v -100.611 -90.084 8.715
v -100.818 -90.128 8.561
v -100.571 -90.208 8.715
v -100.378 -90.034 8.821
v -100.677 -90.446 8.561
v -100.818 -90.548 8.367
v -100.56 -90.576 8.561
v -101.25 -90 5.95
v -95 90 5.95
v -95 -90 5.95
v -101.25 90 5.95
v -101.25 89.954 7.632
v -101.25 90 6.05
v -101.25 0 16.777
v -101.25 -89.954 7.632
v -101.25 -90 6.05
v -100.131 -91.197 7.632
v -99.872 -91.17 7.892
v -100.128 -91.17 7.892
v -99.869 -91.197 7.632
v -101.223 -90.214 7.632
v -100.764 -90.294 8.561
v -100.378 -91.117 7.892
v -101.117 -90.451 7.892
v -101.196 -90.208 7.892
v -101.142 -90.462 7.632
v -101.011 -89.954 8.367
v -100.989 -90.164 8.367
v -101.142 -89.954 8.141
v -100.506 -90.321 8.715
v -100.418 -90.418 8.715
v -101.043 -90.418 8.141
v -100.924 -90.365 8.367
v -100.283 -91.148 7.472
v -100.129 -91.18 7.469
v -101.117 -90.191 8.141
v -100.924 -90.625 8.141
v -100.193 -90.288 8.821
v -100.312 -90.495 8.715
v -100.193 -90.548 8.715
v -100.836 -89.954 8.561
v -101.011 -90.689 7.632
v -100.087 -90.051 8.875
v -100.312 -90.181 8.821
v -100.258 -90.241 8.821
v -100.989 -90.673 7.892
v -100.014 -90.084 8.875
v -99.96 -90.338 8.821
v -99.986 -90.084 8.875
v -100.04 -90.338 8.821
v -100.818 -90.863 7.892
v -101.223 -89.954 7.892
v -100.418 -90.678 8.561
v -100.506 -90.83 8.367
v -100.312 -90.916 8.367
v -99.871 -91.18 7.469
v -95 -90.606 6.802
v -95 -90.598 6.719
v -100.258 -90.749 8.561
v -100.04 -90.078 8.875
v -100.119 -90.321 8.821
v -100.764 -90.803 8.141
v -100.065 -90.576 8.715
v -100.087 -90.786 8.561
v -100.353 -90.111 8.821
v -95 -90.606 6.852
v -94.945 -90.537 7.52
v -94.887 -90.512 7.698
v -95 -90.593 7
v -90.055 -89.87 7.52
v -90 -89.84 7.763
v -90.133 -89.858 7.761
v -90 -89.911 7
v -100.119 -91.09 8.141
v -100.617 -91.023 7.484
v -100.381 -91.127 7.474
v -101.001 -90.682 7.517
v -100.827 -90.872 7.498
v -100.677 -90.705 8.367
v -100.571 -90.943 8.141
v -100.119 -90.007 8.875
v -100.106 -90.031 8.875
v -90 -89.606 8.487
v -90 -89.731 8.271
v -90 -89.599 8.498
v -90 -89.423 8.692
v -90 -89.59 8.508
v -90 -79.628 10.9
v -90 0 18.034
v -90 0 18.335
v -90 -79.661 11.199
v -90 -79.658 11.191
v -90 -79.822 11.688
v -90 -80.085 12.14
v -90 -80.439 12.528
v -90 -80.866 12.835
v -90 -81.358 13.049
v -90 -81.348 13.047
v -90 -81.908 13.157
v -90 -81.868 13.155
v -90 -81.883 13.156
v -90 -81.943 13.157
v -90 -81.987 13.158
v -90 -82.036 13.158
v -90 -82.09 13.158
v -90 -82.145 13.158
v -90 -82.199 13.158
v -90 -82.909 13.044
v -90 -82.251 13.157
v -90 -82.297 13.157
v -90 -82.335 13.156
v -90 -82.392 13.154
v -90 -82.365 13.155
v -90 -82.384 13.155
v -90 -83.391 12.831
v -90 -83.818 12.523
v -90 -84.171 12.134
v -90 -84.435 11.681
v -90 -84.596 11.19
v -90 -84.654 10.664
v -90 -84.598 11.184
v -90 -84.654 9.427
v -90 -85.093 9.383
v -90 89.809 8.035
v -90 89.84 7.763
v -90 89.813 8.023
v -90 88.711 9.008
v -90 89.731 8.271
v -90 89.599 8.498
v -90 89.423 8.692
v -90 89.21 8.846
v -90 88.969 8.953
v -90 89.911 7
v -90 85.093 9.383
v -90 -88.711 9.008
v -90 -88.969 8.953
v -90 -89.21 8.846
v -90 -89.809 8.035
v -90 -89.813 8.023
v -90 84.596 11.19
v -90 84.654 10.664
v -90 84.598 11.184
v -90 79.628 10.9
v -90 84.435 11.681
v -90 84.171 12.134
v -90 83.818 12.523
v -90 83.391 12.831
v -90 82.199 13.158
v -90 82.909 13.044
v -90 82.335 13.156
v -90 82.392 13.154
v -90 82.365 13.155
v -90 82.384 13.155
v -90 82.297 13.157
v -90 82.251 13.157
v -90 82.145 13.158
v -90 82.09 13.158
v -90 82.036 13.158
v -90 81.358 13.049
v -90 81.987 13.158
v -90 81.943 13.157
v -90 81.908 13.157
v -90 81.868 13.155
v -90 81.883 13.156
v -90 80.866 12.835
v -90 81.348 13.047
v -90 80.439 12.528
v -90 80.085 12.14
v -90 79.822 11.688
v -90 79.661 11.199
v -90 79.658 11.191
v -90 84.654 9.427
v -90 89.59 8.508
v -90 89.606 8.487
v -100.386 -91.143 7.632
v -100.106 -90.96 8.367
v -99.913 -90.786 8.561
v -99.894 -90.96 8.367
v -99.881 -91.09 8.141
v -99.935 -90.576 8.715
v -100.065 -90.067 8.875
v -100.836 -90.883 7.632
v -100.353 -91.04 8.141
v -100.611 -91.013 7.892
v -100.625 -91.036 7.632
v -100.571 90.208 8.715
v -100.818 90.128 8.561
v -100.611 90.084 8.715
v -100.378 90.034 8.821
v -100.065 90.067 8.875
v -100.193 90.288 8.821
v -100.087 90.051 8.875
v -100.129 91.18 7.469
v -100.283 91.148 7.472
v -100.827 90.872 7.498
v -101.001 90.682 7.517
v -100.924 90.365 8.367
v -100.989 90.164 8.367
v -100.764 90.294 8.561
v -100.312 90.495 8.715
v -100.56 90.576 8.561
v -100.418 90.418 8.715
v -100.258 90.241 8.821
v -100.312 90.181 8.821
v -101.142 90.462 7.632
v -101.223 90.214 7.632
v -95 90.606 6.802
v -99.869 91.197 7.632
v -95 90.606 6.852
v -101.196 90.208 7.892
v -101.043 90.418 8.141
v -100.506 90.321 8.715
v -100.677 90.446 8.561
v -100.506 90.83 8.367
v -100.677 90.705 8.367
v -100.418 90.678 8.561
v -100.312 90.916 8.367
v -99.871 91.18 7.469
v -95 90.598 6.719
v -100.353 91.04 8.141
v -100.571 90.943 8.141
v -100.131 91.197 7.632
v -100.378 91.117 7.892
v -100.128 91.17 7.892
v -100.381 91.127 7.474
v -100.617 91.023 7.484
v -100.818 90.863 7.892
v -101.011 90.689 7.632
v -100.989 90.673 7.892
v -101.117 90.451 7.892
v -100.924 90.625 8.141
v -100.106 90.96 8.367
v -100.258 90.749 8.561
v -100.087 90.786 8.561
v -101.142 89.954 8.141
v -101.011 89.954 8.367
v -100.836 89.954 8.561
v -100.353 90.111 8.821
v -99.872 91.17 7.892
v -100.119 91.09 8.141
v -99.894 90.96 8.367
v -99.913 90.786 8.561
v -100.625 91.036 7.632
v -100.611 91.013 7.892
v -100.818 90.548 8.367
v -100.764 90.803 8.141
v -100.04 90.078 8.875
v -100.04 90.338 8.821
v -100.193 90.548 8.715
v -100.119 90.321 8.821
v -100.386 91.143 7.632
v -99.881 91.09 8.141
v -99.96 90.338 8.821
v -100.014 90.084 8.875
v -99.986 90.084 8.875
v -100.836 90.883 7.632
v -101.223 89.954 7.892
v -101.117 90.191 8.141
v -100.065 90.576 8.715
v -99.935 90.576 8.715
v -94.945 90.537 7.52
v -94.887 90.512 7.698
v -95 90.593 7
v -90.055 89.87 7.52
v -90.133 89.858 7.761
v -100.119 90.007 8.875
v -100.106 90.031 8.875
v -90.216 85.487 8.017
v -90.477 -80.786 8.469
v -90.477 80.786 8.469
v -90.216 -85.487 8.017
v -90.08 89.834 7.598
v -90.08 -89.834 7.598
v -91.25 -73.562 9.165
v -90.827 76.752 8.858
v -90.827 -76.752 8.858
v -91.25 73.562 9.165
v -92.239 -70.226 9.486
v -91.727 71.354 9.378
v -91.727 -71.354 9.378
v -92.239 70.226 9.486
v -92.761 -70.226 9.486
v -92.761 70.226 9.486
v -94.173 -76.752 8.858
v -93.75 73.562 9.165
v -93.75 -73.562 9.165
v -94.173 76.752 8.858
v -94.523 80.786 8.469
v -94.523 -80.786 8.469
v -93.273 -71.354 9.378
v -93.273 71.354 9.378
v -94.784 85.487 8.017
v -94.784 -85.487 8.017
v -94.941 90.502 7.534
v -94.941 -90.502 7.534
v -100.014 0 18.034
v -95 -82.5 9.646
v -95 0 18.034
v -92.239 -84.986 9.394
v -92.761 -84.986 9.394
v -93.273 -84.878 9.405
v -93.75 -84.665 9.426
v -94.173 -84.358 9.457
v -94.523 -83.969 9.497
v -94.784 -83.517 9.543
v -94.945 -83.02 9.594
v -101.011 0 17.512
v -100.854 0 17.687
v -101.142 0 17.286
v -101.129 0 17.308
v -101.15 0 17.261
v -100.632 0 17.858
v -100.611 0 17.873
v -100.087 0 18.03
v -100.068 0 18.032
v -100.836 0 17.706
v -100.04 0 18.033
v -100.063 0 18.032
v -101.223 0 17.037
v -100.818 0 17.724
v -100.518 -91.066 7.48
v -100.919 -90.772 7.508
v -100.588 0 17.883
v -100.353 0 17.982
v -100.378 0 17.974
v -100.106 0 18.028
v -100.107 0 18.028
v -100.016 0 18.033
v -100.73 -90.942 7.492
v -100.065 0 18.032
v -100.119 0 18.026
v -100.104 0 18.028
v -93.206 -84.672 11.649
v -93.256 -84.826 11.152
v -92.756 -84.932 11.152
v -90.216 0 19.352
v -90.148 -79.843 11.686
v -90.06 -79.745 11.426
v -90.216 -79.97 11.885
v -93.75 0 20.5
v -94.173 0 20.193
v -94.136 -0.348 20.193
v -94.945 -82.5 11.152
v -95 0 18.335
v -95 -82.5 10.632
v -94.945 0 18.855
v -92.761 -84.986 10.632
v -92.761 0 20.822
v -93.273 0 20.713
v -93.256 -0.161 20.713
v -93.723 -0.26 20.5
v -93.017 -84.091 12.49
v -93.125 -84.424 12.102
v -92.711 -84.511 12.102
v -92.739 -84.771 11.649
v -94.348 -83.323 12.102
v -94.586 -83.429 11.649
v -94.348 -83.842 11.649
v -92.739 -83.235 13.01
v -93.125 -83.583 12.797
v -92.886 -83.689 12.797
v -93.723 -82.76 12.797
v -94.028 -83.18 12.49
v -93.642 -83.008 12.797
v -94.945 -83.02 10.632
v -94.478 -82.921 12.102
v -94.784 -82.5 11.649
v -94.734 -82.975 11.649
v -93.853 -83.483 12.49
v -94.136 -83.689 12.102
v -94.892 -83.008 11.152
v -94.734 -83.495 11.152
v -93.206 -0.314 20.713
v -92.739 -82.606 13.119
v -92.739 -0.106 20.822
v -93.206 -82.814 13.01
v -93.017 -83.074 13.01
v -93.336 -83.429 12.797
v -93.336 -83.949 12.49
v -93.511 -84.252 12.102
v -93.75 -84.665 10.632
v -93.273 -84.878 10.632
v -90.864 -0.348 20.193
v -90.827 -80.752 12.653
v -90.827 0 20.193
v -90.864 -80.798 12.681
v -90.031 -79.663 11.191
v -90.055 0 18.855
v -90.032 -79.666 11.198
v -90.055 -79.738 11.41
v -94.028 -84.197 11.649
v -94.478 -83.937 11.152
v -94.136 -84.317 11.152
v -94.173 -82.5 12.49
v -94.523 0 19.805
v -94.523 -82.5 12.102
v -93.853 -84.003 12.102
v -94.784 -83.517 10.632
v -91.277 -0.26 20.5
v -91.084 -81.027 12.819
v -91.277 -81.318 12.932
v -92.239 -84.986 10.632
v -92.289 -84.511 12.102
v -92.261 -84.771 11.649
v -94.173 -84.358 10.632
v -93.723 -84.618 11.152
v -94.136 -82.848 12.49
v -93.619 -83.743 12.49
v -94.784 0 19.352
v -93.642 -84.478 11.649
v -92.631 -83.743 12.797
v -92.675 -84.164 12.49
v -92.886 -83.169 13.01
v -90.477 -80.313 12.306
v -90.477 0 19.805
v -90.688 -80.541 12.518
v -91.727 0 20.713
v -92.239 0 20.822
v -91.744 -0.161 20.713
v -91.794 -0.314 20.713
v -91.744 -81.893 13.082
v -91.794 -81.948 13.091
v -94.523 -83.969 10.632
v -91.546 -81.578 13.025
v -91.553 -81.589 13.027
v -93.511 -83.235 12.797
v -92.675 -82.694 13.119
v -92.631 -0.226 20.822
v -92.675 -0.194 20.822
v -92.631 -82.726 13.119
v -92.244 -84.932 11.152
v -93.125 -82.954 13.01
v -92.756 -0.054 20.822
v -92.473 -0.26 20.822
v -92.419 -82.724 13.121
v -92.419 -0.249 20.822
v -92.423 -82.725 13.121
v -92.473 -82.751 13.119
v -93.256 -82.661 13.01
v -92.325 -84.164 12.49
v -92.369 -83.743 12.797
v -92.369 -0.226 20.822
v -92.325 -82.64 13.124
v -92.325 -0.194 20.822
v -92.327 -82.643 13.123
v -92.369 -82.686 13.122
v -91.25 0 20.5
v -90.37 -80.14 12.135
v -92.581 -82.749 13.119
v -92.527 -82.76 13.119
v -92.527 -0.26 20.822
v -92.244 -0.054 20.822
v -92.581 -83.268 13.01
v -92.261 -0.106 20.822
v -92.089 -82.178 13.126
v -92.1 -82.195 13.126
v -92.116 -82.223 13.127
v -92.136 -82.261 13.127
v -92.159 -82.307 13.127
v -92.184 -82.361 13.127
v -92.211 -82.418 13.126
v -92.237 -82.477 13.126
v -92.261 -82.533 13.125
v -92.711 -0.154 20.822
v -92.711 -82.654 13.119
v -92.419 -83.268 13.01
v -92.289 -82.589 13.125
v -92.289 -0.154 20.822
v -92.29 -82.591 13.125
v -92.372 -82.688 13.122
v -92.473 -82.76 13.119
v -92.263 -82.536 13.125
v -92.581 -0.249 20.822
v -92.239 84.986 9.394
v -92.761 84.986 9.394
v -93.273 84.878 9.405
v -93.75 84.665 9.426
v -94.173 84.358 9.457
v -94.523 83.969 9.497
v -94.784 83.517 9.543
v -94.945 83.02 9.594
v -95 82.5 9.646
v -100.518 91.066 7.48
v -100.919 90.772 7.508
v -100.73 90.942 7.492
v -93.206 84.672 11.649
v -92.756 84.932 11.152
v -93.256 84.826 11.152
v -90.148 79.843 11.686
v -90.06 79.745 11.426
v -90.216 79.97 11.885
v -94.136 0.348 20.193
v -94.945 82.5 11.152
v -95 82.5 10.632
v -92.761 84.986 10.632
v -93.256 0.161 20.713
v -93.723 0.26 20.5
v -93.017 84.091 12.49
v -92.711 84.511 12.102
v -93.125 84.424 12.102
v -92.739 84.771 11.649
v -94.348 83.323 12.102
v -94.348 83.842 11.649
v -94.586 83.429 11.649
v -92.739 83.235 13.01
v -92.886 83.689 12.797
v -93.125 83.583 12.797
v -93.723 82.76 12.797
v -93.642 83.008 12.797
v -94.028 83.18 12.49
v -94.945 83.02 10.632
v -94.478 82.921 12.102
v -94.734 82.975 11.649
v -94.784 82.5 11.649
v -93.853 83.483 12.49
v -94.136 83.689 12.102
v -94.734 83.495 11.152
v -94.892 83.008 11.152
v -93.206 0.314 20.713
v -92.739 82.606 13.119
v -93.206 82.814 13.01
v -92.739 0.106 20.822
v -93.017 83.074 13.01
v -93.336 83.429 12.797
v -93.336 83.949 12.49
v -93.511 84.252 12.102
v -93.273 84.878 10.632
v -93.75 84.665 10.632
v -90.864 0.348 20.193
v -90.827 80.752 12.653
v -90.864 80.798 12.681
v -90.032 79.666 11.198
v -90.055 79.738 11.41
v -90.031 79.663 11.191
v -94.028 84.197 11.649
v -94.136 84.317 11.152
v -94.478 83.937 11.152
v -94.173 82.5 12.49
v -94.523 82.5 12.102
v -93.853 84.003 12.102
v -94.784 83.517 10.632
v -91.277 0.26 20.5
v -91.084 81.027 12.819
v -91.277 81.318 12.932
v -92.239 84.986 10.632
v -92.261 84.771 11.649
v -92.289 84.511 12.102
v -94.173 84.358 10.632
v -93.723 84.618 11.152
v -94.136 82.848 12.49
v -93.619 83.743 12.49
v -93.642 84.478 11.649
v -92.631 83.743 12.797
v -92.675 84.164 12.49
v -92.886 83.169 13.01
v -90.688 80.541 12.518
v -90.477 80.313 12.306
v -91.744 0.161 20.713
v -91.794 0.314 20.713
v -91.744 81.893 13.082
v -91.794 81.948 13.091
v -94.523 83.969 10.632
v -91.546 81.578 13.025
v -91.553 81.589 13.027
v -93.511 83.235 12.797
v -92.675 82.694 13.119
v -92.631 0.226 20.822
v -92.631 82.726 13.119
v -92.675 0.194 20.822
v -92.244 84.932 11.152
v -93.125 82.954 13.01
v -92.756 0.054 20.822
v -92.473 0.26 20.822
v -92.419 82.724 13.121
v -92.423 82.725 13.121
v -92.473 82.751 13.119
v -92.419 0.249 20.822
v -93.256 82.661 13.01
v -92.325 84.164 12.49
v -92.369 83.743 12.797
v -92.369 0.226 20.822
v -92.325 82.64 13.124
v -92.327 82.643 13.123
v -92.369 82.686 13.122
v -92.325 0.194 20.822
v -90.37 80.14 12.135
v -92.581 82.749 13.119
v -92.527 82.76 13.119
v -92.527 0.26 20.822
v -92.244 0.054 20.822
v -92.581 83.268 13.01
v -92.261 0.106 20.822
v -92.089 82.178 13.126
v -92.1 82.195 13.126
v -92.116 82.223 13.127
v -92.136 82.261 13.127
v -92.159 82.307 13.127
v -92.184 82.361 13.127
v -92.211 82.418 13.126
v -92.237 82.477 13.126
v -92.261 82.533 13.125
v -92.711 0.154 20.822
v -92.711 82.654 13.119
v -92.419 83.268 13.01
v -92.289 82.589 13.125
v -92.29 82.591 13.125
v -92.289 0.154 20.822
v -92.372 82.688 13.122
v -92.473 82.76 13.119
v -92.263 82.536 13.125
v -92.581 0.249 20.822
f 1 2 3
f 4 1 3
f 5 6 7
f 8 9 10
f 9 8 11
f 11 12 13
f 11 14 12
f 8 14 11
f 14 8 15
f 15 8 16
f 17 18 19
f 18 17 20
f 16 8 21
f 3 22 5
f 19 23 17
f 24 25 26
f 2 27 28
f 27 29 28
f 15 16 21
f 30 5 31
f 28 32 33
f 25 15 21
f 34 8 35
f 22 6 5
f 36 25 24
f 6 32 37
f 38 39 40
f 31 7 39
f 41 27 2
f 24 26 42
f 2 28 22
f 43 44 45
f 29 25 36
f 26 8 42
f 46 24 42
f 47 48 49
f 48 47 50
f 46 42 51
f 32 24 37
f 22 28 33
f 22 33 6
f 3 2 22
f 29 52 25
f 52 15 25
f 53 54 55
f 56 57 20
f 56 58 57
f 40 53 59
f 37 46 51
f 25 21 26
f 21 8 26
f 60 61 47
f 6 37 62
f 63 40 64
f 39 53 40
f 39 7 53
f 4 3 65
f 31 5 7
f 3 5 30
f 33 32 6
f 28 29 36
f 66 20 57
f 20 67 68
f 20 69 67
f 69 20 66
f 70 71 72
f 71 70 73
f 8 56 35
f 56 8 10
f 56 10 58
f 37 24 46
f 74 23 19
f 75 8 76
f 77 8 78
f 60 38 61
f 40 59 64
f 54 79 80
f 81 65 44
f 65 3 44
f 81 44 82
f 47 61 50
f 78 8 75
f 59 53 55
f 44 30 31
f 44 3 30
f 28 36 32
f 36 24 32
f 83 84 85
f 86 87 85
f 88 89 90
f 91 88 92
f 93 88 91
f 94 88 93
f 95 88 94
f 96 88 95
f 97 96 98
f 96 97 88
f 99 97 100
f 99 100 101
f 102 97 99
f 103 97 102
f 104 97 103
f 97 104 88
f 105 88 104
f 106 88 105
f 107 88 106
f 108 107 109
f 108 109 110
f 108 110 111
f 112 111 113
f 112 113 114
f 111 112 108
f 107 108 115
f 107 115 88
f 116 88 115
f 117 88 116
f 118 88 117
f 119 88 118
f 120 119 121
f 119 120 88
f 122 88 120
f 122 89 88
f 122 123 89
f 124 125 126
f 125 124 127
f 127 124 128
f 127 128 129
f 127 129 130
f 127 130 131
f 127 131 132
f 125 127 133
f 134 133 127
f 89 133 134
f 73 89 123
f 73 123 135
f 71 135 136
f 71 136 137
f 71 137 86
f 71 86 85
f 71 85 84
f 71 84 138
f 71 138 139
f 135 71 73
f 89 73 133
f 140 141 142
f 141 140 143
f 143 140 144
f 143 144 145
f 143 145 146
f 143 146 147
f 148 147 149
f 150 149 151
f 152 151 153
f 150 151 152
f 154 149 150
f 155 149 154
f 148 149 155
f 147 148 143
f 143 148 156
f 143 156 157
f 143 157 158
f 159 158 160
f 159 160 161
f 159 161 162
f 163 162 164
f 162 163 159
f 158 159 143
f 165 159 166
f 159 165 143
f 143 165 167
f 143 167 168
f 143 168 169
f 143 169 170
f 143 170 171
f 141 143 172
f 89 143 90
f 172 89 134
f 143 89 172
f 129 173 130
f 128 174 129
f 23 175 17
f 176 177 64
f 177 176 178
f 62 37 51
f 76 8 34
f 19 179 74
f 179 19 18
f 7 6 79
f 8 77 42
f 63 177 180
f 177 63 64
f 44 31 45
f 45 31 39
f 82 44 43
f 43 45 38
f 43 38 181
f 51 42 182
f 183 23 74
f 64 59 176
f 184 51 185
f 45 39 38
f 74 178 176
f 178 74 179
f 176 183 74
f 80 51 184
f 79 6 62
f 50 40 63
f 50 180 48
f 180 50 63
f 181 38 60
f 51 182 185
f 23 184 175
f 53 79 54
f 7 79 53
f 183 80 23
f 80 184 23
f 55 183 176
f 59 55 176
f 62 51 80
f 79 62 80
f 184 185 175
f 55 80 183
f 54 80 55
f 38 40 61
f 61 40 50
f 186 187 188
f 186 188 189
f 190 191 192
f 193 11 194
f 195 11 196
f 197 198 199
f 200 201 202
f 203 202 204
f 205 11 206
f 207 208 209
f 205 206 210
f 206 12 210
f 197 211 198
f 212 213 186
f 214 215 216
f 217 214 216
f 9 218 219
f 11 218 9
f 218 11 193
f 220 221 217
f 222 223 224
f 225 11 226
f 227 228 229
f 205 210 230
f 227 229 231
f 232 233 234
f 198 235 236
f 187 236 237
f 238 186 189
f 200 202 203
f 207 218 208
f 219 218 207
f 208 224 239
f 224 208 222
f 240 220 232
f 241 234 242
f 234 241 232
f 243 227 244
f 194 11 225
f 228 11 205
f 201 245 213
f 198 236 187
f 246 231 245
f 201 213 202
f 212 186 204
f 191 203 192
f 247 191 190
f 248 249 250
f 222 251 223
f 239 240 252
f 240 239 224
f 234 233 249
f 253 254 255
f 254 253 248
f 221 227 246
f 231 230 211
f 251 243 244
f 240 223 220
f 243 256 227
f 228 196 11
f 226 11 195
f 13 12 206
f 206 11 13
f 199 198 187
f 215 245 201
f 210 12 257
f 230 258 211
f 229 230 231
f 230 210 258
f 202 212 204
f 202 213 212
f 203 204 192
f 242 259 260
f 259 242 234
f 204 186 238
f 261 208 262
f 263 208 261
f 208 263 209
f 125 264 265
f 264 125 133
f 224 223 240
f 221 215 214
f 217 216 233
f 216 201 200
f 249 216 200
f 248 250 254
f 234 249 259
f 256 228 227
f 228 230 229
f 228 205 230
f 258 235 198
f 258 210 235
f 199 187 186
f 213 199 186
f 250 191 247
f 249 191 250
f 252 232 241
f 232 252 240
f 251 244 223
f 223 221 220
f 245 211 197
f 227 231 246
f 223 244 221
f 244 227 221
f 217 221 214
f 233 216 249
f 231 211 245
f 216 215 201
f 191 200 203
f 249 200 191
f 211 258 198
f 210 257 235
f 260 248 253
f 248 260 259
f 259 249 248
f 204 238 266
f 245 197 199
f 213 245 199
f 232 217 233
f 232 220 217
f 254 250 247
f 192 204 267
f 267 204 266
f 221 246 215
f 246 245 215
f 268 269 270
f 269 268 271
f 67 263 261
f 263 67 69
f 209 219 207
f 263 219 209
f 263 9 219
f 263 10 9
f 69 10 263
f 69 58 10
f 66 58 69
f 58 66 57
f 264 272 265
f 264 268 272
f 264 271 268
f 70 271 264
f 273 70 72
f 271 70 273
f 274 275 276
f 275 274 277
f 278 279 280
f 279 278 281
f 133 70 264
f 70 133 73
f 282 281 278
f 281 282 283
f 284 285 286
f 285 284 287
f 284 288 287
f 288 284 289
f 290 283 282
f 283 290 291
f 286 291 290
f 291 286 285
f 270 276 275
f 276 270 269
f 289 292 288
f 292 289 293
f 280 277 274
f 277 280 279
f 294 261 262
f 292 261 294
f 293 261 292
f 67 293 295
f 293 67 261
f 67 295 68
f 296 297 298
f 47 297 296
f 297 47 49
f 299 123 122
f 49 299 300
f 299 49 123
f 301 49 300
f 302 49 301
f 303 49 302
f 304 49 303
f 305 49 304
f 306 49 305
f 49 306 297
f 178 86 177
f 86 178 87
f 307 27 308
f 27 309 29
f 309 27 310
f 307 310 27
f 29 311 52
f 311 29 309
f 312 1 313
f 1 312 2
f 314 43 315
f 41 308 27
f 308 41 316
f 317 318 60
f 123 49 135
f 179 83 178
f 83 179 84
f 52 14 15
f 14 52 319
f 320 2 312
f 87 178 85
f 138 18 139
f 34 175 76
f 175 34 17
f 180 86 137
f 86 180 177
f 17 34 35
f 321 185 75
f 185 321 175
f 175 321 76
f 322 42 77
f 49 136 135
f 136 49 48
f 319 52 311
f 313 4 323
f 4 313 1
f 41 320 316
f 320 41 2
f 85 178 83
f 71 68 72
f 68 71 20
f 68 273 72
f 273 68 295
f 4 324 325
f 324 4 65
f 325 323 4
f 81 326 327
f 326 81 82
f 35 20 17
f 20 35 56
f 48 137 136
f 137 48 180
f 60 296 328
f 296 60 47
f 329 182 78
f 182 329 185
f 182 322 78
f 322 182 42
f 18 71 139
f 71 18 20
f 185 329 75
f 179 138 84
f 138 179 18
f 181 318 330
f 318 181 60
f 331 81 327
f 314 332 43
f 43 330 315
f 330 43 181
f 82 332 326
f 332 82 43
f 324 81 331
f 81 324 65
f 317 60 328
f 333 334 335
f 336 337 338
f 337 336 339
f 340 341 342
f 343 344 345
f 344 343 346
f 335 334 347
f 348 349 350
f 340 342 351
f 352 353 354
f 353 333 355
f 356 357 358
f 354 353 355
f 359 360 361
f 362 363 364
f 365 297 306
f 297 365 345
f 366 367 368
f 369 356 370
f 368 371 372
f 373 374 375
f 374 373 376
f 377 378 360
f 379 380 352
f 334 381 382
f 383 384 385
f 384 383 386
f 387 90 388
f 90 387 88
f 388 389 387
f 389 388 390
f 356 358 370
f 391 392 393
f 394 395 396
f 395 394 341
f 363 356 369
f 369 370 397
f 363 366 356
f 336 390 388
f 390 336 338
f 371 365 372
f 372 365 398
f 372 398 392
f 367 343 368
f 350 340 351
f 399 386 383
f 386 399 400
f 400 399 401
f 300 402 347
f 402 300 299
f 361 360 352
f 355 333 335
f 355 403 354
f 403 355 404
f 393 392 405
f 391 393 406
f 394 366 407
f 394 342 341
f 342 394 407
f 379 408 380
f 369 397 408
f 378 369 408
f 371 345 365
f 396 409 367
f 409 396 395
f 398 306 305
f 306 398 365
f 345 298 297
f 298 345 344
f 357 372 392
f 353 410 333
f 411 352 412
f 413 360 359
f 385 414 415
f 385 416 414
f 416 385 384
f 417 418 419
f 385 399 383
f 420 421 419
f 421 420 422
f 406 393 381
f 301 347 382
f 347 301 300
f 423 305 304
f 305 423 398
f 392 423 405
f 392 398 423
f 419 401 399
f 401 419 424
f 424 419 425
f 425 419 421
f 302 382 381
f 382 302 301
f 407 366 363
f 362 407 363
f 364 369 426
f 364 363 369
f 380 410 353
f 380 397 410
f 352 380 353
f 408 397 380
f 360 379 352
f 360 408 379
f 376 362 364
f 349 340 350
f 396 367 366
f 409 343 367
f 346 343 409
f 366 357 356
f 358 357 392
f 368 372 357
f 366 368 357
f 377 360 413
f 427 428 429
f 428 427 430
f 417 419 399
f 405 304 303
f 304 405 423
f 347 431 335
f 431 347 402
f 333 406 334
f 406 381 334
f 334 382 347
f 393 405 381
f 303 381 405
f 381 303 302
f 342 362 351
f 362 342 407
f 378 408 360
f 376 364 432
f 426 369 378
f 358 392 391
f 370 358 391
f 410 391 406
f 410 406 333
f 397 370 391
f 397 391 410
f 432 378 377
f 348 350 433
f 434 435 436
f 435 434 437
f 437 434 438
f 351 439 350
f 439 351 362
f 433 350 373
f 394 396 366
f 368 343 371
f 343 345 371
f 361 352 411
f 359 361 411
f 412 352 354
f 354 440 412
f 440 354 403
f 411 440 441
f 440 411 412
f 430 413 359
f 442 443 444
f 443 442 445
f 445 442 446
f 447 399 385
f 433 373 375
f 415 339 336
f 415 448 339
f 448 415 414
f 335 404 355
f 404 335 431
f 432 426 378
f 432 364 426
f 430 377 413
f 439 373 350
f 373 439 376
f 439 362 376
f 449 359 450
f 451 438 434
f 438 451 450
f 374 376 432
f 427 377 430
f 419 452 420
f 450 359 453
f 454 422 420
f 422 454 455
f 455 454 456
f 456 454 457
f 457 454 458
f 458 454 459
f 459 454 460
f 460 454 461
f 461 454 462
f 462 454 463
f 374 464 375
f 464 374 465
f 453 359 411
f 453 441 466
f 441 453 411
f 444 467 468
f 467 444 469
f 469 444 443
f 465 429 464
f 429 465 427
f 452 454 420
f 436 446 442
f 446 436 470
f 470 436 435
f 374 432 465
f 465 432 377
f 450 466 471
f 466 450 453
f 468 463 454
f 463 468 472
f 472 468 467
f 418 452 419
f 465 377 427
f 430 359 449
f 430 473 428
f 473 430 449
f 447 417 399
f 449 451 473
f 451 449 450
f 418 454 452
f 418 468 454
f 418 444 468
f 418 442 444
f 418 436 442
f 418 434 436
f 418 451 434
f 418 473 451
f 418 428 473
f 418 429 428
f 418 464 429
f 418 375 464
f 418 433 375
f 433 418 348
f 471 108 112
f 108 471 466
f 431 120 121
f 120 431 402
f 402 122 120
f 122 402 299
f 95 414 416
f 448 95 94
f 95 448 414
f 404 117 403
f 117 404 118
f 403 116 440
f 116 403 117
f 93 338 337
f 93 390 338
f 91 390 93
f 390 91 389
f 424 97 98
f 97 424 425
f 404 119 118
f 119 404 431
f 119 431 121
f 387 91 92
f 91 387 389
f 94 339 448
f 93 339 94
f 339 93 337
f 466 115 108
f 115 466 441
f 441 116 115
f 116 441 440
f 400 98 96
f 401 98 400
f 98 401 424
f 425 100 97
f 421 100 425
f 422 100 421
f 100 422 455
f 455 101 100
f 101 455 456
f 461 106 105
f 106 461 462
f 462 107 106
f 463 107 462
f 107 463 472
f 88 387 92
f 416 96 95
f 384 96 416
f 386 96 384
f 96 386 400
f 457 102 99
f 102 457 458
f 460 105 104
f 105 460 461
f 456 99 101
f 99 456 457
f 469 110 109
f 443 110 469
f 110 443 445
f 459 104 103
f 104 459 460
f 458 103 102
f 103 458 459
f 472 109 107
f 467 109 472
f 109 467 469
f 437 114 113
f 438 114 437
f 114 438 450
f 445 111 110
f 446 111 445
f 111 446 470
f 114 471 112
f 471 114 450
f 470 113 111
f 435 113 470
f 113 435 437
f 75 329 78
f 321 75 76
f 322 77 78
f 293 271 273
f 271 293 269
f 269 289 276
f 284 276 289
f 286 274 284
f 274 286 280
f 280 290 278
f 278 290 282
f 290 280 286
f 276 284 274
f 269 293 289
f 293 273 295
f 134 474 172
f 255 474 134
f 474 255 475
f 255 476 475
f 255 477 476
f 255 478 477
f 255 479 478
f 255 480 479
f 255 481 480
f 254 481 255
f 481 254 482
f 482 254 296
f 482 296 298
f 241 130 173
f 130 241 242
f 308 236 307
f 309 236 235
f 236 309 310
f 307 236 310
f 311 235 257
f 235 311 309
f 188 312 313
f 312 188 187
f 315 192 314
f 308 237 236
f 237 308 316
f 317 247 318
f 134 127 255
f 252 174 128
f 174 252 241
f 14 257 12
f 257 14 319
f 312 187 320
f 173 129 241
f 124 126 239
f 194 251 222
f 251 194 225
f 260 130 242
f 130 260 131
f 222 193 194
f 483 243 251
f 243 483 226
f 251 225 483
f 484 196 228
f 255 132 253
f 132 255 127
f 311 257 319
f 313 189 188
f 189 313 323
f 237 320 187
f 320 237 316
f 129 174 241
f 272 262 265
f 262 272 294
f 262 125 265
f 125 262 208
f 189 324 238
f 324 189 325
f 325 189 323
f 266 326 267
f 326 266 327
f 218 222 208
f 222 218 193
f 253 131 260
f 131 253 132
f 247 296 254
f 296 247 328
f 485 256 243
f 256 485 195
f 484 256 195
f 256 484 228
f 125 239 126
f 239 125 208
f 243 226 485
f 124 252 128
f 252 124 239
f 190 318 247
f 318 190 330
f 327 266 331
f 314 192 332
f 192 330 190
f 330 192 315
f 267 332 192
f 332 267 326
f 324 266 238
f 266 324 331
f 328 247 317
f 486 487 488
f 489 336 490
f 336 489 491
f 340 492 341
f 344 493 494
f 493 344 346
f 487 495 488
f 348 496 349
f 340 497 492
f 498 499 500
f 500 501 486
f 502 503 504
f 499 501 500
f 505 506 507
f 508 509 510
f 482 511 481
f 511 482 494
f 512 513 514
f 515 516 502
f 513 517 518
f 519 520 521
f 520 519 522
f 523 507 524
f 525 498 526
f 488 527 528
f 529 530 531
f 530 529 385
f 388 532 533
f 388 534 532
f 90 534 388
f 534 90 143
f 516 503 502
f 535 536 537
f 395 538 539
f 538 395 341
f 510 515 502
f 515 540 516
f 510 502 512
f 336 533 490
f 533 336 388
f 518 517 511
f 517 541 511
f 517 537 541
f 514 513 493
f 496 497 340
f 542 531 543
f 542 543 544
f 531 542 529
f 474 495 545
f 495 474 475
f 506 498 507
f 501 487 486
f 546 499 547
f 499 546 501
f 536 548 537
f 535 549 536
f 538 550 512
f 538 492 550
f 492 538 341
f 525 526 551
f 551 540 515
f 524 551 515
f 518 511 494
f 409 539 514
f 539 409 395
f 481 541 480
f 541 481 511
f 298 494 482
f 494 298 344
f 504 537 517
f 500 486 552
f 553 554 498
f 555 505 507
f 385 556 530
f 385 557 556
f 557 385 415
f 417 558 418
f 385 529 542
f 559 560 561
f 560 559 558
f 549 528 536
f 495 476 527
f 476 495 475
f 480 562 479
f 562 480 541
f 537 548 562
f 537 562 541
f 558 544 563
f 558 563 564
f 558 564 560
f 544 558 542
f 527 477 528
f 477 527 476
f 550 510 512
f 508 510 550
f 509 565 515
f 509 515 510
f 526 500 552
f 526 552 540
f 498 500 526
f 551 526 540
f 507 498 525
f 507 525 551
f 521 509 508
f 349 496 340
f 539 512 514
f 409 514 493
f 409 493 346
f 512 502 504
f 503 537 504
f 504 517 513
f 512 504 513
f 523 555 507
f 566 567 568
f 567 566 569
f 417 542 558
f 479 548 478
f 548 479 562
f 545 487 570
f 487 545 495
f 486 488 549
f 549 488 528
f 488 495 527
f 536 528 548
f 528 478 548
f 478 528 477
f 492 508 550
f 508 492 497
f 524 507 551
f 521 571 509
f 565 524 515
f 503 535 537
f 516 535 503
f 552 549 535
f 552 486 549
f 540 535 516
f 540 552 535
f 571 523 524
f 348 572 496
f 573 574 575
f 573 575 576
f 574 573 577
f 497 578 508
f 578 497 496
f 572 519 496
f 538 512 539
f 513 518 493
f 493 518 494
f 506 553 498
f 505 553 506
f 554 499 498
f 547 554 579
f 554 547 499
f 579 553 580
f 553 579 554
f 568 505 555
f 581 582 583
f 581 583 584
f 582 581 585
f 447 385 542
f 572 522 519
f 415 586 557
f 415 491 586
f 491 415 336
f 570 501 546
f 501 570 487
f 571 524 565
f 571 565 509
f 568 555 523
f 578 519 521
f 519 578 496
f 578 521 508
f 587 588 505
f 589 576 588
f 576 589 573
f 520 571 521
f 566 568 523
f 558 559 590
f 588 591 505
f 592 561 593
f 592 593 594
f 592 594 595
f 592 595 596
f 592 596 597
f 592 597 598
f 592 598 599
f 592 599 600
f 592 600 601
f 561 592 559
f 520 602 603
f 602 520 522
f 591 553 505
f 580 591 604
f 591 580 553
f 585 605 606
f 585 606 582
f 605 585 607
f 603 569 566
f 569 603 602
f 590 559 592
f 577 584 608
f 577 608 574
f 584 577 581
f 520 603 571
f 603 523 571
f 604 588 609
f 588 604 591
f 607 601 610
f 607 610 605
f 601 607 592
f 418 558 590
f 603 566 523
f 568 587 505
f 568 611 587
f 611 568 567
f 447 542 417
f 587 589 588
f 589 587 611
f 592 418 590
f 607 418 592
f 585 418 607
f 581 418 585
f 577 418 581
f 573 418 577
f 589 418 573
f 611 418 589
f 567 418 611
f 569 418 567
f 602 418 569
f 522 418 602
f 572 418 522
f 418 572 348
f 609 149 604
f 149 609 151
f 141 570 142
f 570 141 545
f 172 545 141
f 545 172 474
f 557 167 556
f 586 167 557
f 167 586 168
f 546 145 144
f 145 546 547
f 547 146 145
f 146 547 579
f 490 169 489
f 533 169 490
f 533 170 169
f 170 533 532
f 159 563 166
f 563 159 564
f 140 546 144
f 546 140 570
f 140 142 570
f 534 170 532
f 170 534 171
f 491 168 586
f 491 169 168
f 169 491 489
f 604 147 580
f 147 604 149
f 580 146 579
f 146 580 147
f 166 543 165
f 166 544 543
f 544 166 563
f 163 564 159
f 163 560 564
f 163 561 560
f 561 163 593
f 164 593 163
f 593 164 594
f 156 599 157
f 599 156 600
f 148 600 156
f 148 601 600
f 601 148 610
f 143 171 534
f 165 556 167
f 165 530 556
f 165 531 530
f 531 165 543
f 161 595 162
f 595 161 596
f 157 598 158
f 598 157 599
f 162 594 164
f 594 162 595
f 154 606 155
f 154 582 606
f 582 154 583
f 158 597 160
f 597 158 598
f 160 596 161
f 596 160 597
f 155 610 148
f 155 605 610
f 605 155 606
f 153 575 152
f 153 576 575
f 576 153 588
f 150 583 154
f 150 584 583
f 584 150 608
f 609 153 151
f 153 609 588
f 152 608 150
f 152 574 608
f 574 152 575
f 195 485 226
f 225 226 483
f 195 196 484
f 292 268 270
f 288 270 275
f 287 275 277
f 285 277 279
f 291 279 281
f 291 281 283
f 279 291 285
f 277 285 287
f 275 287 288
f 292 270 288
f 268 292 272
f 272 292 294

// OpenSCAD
HX=180;
HYR=105;
HYL=160;
ANG=5.5;
HHR=HYR/(2*sin(90-ANG));
HHL=HYL/(2*sin(90-ANG));
BX=500;
BY=160;
BA=BY*sin(ANG);

*boat(HX,HHR,HYR,HHL,HYL);
*holderV2(HX,HHL,HYL,HHR,HYR,1.25,10,30);
*mirror([0,1,0]) holderV2(HX,HHL,HYL,HHR,HYR,1.25,10,30);
*translate([0,0,4]) cover(HX,HHL,HYL,HHR,HYR,7,15,4,1.5,30);
*translate([-80,-40,BA+0.5]) rotate([0,0,0]) fixer(8,5,8,60);
*translate([30,35,25])SwedenAntHolder();
*ColAntenaHolder();
seal_fixer(HX,HHL,HYL,HHR,HYR,1.25,10,30);

*ColAntenaHolder_p2();

*translate([200,0,35]) calypsoMount();

module calypsoMount(){
   difference(){
      union(){
         translate([0,0,1])
         hull(){
            rotate_extrude(convexity = 10,$fn=100)
                     translate([20.5, 0, 0])
                     circle(r = 5,$fn=100);
            translate([0,0,-4.5]) cylinder(h=1,r=25.8,center=true,$fn=100);
         }
         translate([0,0,-11])
         rotate_extrude(convexity = 10,$fn=100)
         difference(){
            translate([7,0]) square([14,15],center=true);
            translate([7.5+7, 0, 0]) circle(r = 7.5,$fn=100);
         }
         hull(){
            translate([0,-20,-20]) rotate([5.5,0,0]) cylinder(h=2,r=12,center=true,$fn=50);
            translate([0,0,-18]) rotate([0,90,0]) cylinder(h=24,r=1,center=true,$fn=50);
            
         }
         hull(){
            translate([0,20,-20]) rotate([-5.5,0,0]) cylinder(h=2,r=12,center=true,$fn=50);
            translate([0,0,-18]) rotate([0,90,0]) cylinder(h=24,r=1,center=true,$fn=50);
            
         }
      }
      for(i=[-27.5:120:360]){
         rotate([0,0,i]) translate([19,0,-0.5]) rotate([0,90,0]) cylinder(h=15,r=1.65,center=true,$fn=50);
      }
      cylinder(h=40,r=6,center=true,$fn=50);
      translate([0,-25,-20]) rotate([5.5,0,0]) cylinder(h=10,r=2,center=true,$fn=50);
      translate([0,25,-20]) rotate([-5.5,0,0]) cylinder(h=10,r=2,center=true,$fn=50);
   }
   
}

module ColAntenaHolder(){
   translate([24,-21.35,35]) rotate([-90,0,90]) SwedenAntHolder();
   difference(){
      translate([0,0,23.5]) cylinder(h=10,r=24,center=true,$fn=100);
      hull(){cover(HX,HY,HH,7,15,3,1.5,30);}
      translate([0,0,23.5]) cylinder(h=12,r=9.5,center=true,$fn=100);
      for(i=[0:120:360]){
         rotate([0,0,i]) translate([20,0,28]) cylinder(h=20,r=1.6,center=true,$fn=20);
      }
   }
}

module ColAntenaHolder_p2(){
   difference(){
      translate([0,0,15.5]) cylinder(h=11,r=11,center=true,$fn=100);
      rotate([0,0,30]) translate([0,0,15.5]) cylinder(h=15,r=9,center=true,$fn=6);
   }
   difference(){
      translate([0,0,14]) cylinder(h=8,r=24,center=true,$fn=100);
      translate([0,0,0]) cover(HX,HY,HH,7,15,3,1.5,30);
      translate([0,0,14]) cylinder(h=9,r=9.5,center=true,$fn=100);
      for(i=[0:120:360]){
         rotate([0,0,i]) translate([20,0,10]) cylinder(h=20,r=1.6,center=true,$fn=20);
      }
   }
}

module SwedenAntHolder(){
   translate([24,-21.35,0]) rotate([-90,0,90]) import("puck_antenna_mount.stl", convexity = 5);
}

module boat(hx,hhR,hyR,hhL,hyL){
   ha=HHR*sin(ANG);
   difference(){
      union(){
         translate([0,-(BY*sin(90-ANG))/2,BA/2]) rotate([ANG,0,0])cube([BX,BY,2],center=true);
         translate([0,(BY*sin(90-ANG))/2,BA/2]) rotate([-ANG,0,0])cube([BX,BY,2],center=true);
      }
      linear_extrude(height = 40, center = true, convexity = 10, twist = 0) 
      polygon(points=[[hx/2,hyR/2],[hx/2,-hyR/2],[-hx/2,-hyL/2],[-hx/2,hyL/2]]);
   }
}

module seal_fixer(hx,hhL,hyL,hhR,hyR,th,d,fn){
   difference(){
      union(){
         hull(){
            difference(){
               union(){
                  hull(){
                     translate([(hx/2+d),d,1.5+BA+d*sin(ANG)]) sphere(th,$fn=fn);
                     translate([-(hx/2+d),d,1.5+BA+d*sin(ANG)]) sphere(th,$fn=fn);
                     translate([-(hx/2+d),-(hyL/2+d*cos(ANG)),BA-(hhL)*sin(ANG)]) sphere(th,$fn=fn);
                     translate([(hx/2+d),-(hyR/2+d*cos(ANG)),BA-(hhR)*sin(ANG)]) sphere(th,$fn=fn);
                     
                  }
                  
               }
               translate([0,BY/4,BA]) cube([BX,BY/2,BA],center=true);
               translate([0,-(hhR+d)*sin(90-ANG)/2+1,BA-(hhR+d)*sin(ANG)/2-1]) rotate([ANG,0,0])cube([hx+3*d,2*hhL+2*d+1,4],center=true);
               cube([hx,2*hyR,hyR],center=true);
               translate([d,0,0]) cube([hx+d,2*hyR,hyR],center=true);
            }
            translate([-hx/2-d/2-1.25/2,-hyL/4-d/2,6])cube([d+1.25,hyL/2+d,0.1],center=true);
         }
         mirror([0,1,0])
         hull(){
            difference(){
               union(){
                  hull(){
                     translate([(hx/2+d),d,1.5+BA+d*sin(ANG)]) sphere(th,$fn=fn);
                     translate([-(hx/2+d),d,1.5+BA+d*sin(ANG)]) sphere(th,$fn=fn);
                     translate([-(hx/2+d),-(hyL/2+d*cos(ANG)),BA-(hhL)*sin(ANG)]) sphere(th,$fn=fn);
                     translate([(hx/2+d),-(hyR/2+d*cos(ANG)),BA-(hhR)*sin(ANG)]) sphere(th,$fn=fn);
                     
                  }
                  
               }
               translate([0,BY/4,BA]) cube([BX,BY/2,BA],center=true);
               translate([0,-(hhR+d)*sin(90-ANG)/2+1,BA-(hhR+d)*sin(ANG)/2-1]) rotate([ANG,0,0])cube([hx+3*d,2*hhL+2*d+1,4],center=true);
               cube([hx,2*hyR,hyR],center=true);
               translate([d,0,0]) cube([hx+d,2*hyR,hyR],center=true);
            }
            translate([-hx/2-d/2-1.25/2,-hyL/4-d/2,6])cube([d+1.25,hyL/2+d,0.1],center=true);
         }
         
      }
      hull(){
            translate([-hx/2-2*th,0,7]) rotate([90,0,0]) cylinder(h=2*hyL,r=2*th,center=true,$fn=fn);
            translate([-hx/2-2*th,0,-2]) rotate([90,0,0]) cylinder(h=2*hyL,r=2*th,center=true,$fn=fn);
         }
   }
   difference(){
      union(){
         holderV2(HX,HHL,HYL,HHR,HYR,1.25,10,30);
         mirror([0,1,0]) holderV2(HX,HHL,HYL,HHR,HYR,1.25,10,30);
      }
      translate([d/2+2,0,0]) cube([hx+d+4,4*hyR,hyR],center=true);
   }
}

module holderV2(hx,hhL,hyL,hhR,hyR,th,d,fn){
   ha=HHR*sin(ANG);
   difference(){
      union(){
         rotate([0,0,0])
         hull(){
            translate([(hx/2+d),d,1.5+BA+d*sin(ANG)]) sphere(th,$fn=fn);
            translate([-(hx/2+d),d,1.5+BA+d*sin(ANG)]) sphere(th,$fn=fn);
            translate([-(hx/2+d),-(hyL/2+d*cos(ANG)),BA-(hhL)*sin(ANG)]) sphere(th,$fn=fn);
            translate([(hx/2+d),-(hyR/2+d*cos(ANG)),BA-(hhR)*sin(ANG)]) sphere(th,$fn=fn);
         }
         hull(){
            translate([-(hx/2+2*th),0,BA]) sphere(2*th,$fn=fn);
            translate([-(hx/2+2*th),0,3+BA]) sphere(2*th,$fn=fn);
            translate([-(hx/2+2*th),-(hyL/2+2*th),BA-hhL*sin(ANG)]) sphere(2*th,$fn=fn);
            translate([-(hx/2+2*th),-(hyL/2+2*th),3+BA-hhL*sin(ANG)]) sphere(2*th,$fn=fn);
         }
         
         hull(){
            translate([-(hx/2+2*th),-(hyL/2+2*th),BA-hhL*sin(ANG)]) sphere(2*th,$fn=fn);
            translate([-(hx/2+2*th),-(hyL/2+2*th),3+BA-hhL*sin(ANG)]) sphere(2*th,$fn=fn);
            translate([(hx/2+2*th),-(hyR/2+2*th),BA-hhR*sin(ANG)]) sphere(2*th,$fn=fn);
            translate([(hx/2+2*th),-(hyR/2+2*th),3+BA-hhR*sin(ANG)]) sphere(2*th,$fn=fn);
         }
         hull(){
            translate([(hx/2+2*th),0,BA]) sphere(2*th,$fn=fn);
            translate([(hx/2+2*th),0,3+BA]) sphere(2*th,$fn=fn);
            translate([(hx/2+2*th),-(hyR/2+2*th),BA-hhR*sin(ANG)]) sphere(2*th,$fn=fn);
            translate([(hx/2+2*th),-(hyR/2+2*th),3+BA-hhR*sin(ANG)]) sphere(2*th,$fn=fn);
         }
      }

      linear_extrude(height = 40, center = true, convexity = 10, twist = 0) 
      polygon(points=[[hx/2,hyR/2],[hx/2,-hyR/2],[-hx/2,-hyL/2],[-hx/2,hyL/2]]);
      cube([hx,hyR/2,hyR],center=true);
      translate([0,BY/4,BA]) cube([BX,BY/2,BA],center=true);
      translate([0,-(hhR+d)*sin(90-ANG)/2+1,BA-(hhR+d)*sin(ANG)/2-1]) rotate([ANG,0,0])cube([hx+3*d,2*hhL+2*d+1,4],center=true);
   }
}

module holder(hx,hh,hy,th,d,fn){
   ha=HH*sin(ANG);
   difference(){
      union(){
         #translate([0,-((hh)*sin(90-ANG))/2,-(hh)*sin(ANG)/2+BA+sin(90-ANG)]) rotate([ANG,0,0])
         hull(){
            translate([(hx/2+d),(hh/2+d),0]) sphere(th,$fn=fn);
            translate([-(hx/2+d),(hh/2+d),0]) sphere(th,$fn=fn);
            translate([-(hx/2+d),-(hh/2+d),0]) sphere(th,$fn=fn);
            translate([(hx/2+d),-(hh/2+d),0]) sphere(th,$fn=fn);
         }
         hull(){
            translate([-(hx/2+2*th),0,BA+8*sin(ANG)-th/2]) sphere(2*th,$fn=fn);
            translate([-(hx/2+2*th),0,3+BA+8*sin(ANG)-th/2]) sphere(2*th,$fn=fn);
            translate([-(hx/2+2*th),-(hy/2+2*th),ha+8*sin(ANG)]) sphere(2*th,$fn=fn);
            translate([-(hx/2+2*th),-(hy/2+2*th),3+ha+8*sin(ANG)]) sphere(2*th,$fn=fn);
         }
         translate([0,-(hy/2+2*th),ha+8*sin(ANG)])
         hull(){
            translate([-(hx/2+2*th),0,0]) sphere(2*th,$fn=fn);
            translate([-(hx/2+2*th),0,3]) sphere(2*th,$fn=fn);
            translate([(hx/2+2*th),0,0]) sphere(2*th,$fn=fn);
            translate([(hx/2+2*th),0,3]) sphere(2*th,$fn=fn);
         }
         hull(){
            translate([(hx/2+2*th),0,BA+8*sin(ANG)-th/2]) sphere(2*th,$fn=fn);
            translate([(hx/2+2*th),0,3+BA+8*sin(ANG)-th/2]) sphere(2*th,$fn=fn);
            translate([(hx/2+2*th),-(hy/2+2*th),ha+8*sin(ANG)]) sphere(2*th,$fn=fn);
            translate([(hx/2+2*th),-(hy/2+2*th),3+ha+8*sin(ANG)]) sphere(2*th,$fn=fn);
         }
      }
      *translate([0,-hh*sin(90-ANG)/2,BA-8*sin(90-ANG)/2]) rotate([ANG,0,0])cube([hx,hh,8],center=true);
      translate([0,-hy/4,0]) cube([hx,hy/2,hy],center=true);
      translate([0,BY/4,BA]) cube([BX,BY/2,BA],center=true);
      translate([0,0,BA]) cube([hx,BY/2,BA],center=true);
      translate([0,-(hh+d)*sin(90-ANG)/2+1,BA-(hh+d)*sin(ANG)/2-1]) rotate([ANG,0,0])cube([hx+3*d,hh+2*d+1,4],center=true);
   }
}
//HX,HHL,HYL,HHR,HYR,7,15,3,1.5,30
module cover_half(hx,hhL,hyL,hhR,hyR,d,d2,th,th2,fn){
   ha=hhL*sin(ANG);
   
   difference(){
      hull(){
         // Left corners
         translate([-(hx/2+d),-(hyL/2+d),BA-(hhL*sin(ANG))]) sphere(th,$fn=fn);
         translate([-(hx/2+d),-(hyL/2+d),BA-(hhL*sin(ANG))-th+0.5]) cylinder(h=1,r=th,center=true,$fn=fn);
         // Rigth corners
         translate([(hx/2+d),-(hyR/2+d),BA-(hhR*sin(ANG))]) sphere(th,$fn=fn);
         translate([(hx/2+d),-(hyR/2+d),BA-(hhR*sin(ANG))-th+0.5]) cylinder(h=1,r=th,center=true,$fn=fn);
         
         // Rigth Center
         translate([(hx/2+d),0,BA]) sphere(th,$fn=fn);
         translate([(hx/2+d),0,BA-th+0.5]) cylinder(h=1,r=th,center=true,$fn=fn);
         
         // Left Center
         translate([-(hx/2+d),0,BA]) sphere(th,$fn=fn);
         translate([-(hx/2+d),0,BA-th+0.5])  cylinder(h=1,r=th,center=true,$fn=fn);
            
      }
      translate([0,0,-5.27]) holderV2(HX,hhL,hyL,hhR,hyR,1.4,15,30);
      translate([0,BY/4,BA]) cube([BX,BY/2,2*BA],center=true);
      translate([80,-30,BA/1.2]) rotate([ANG,0,0]) fixer_hole(8,5,10,60);
      translate([-80,-40,BA/1.3]) rotate([ANG,0,0]) fixer_hole(8,5,10,60);
      
      translate([0,-58,BA/1.5]) rotate([ANG,0,0]) fixer_hole(8,5,10,60);
   }
   
}

//HX,HHL,HYL,HHR,HYR,7,15,3,1.5,30
module cover(hx,hhL,hyL,hhR,hyR,d,d2,th,th2,fn){
   
   cover_half(hx,hhL,hyL,hhR,hyR,d,d2,th,th2,fn);
         
   difference(){
      union(){
         mirror([0,1,0]) cover_half(hx,hhL,hyL,hhR,hyR,d,d2,th,th2,fn);
         // Antena Holder
         translate([30,35,15]) cylinder(h=12,r=13,center=true,$fn=2*fn);
      }
      translate([30,35,12]) rotate([0,0,30]) cylinder(h=12,r=9.5,center=true,$fn=6);
      translate([30,35,12]) rotate([0,0,30]) cylinder(h=40,r=6.2,center=true,$fn=2*fn);
   }
}

module fixer(r1,r2,d,fn){
   difference(){
      translate([0,0,d/4]) cylinder(h=d/2,r=r1,center=true,$fn=fn);
      translate([-0.7*r1,-0.3*r1,d/2]) sphere(1,$fn=50);
      cylinder(h=12,r=1,center=true,$fn=fn);
   }
   difference(){
      translate([0,0,-d/4]) cylinder(h=d/2,r=r2,center=true,$fn=fn);
      translate([0, 0, -2.75])
         linear_extrude(height = 4.1, center = true, convexity = 10, twist = 0)
         polygon(points=[[2.6,2.6],[2.6,-2.6],[-2.6,-2.6],[-4.1,0],[-2.6,2.6]]);
      cylinder(h=10,r=1,center=true,$fn=fn);
   }
   difference(){
      translate([0,0,2]) scale([1,0.2,0.8]) sphere(r1,$fn=fn);
      translate([0,0,-10]) cube([20,20,20],center=true);
      cylinder(h=12,r=1,center=true,$fn=fn);
   }
}

module fixer_hole(r1,r2,d,fn){
   translate([0,0,d/4]) cylinder(h=d/2+0.2,r=r1+0.4,center=true,$fn=fn);
   translate([0,0,-d/4]) cylinder(h=d/2+0.2,r=r2+0.4,center=true,$fn=fn);
}

module fixer_tab(r1,r2,l,fn){
   difference(){
      union(){
         hull(){
            translate([0,0,-0.25]) cylinder(h=0.5,r=r1,center=true,$fn=fn);
            translate([0,0,-3]) cylinder(h=0.1,r=r2,center=true,$fn=fn);
         }
         hull(){
            translate([0,0,-0.25]) cylinder(h=0.5,r=r2,center=true,$fn=fn);
            translate([0,0,-3]) cylinder(h=0.1,r=r2,center=true,$fn=fn);
            translate([l,0,-1]) //cylinder(h=1,r=r2/1.5,center=true,$fn=fn);
            rotate_extrude(convexity = 10,$fn=fn)
               translate([r2/1.5, 0, 0])
               circle(r = 1,$fn=fn);
         }
         translate([0, 0, 2])
         linear_extrude(height = 4, center = true, convexity = 10, twist = 0)
         polygon(points=[[2.5,2.5],[4,0],[2.5,-2.5],[-2.5,-2.5],[-2.5,2.5]]);
      }
      cylinder(h=10,r=1,center=true,$fn=fn);
      translate([0, 0, -2])cylinder(h=4,r=2,center=true,$fn=fn);
   }
}
